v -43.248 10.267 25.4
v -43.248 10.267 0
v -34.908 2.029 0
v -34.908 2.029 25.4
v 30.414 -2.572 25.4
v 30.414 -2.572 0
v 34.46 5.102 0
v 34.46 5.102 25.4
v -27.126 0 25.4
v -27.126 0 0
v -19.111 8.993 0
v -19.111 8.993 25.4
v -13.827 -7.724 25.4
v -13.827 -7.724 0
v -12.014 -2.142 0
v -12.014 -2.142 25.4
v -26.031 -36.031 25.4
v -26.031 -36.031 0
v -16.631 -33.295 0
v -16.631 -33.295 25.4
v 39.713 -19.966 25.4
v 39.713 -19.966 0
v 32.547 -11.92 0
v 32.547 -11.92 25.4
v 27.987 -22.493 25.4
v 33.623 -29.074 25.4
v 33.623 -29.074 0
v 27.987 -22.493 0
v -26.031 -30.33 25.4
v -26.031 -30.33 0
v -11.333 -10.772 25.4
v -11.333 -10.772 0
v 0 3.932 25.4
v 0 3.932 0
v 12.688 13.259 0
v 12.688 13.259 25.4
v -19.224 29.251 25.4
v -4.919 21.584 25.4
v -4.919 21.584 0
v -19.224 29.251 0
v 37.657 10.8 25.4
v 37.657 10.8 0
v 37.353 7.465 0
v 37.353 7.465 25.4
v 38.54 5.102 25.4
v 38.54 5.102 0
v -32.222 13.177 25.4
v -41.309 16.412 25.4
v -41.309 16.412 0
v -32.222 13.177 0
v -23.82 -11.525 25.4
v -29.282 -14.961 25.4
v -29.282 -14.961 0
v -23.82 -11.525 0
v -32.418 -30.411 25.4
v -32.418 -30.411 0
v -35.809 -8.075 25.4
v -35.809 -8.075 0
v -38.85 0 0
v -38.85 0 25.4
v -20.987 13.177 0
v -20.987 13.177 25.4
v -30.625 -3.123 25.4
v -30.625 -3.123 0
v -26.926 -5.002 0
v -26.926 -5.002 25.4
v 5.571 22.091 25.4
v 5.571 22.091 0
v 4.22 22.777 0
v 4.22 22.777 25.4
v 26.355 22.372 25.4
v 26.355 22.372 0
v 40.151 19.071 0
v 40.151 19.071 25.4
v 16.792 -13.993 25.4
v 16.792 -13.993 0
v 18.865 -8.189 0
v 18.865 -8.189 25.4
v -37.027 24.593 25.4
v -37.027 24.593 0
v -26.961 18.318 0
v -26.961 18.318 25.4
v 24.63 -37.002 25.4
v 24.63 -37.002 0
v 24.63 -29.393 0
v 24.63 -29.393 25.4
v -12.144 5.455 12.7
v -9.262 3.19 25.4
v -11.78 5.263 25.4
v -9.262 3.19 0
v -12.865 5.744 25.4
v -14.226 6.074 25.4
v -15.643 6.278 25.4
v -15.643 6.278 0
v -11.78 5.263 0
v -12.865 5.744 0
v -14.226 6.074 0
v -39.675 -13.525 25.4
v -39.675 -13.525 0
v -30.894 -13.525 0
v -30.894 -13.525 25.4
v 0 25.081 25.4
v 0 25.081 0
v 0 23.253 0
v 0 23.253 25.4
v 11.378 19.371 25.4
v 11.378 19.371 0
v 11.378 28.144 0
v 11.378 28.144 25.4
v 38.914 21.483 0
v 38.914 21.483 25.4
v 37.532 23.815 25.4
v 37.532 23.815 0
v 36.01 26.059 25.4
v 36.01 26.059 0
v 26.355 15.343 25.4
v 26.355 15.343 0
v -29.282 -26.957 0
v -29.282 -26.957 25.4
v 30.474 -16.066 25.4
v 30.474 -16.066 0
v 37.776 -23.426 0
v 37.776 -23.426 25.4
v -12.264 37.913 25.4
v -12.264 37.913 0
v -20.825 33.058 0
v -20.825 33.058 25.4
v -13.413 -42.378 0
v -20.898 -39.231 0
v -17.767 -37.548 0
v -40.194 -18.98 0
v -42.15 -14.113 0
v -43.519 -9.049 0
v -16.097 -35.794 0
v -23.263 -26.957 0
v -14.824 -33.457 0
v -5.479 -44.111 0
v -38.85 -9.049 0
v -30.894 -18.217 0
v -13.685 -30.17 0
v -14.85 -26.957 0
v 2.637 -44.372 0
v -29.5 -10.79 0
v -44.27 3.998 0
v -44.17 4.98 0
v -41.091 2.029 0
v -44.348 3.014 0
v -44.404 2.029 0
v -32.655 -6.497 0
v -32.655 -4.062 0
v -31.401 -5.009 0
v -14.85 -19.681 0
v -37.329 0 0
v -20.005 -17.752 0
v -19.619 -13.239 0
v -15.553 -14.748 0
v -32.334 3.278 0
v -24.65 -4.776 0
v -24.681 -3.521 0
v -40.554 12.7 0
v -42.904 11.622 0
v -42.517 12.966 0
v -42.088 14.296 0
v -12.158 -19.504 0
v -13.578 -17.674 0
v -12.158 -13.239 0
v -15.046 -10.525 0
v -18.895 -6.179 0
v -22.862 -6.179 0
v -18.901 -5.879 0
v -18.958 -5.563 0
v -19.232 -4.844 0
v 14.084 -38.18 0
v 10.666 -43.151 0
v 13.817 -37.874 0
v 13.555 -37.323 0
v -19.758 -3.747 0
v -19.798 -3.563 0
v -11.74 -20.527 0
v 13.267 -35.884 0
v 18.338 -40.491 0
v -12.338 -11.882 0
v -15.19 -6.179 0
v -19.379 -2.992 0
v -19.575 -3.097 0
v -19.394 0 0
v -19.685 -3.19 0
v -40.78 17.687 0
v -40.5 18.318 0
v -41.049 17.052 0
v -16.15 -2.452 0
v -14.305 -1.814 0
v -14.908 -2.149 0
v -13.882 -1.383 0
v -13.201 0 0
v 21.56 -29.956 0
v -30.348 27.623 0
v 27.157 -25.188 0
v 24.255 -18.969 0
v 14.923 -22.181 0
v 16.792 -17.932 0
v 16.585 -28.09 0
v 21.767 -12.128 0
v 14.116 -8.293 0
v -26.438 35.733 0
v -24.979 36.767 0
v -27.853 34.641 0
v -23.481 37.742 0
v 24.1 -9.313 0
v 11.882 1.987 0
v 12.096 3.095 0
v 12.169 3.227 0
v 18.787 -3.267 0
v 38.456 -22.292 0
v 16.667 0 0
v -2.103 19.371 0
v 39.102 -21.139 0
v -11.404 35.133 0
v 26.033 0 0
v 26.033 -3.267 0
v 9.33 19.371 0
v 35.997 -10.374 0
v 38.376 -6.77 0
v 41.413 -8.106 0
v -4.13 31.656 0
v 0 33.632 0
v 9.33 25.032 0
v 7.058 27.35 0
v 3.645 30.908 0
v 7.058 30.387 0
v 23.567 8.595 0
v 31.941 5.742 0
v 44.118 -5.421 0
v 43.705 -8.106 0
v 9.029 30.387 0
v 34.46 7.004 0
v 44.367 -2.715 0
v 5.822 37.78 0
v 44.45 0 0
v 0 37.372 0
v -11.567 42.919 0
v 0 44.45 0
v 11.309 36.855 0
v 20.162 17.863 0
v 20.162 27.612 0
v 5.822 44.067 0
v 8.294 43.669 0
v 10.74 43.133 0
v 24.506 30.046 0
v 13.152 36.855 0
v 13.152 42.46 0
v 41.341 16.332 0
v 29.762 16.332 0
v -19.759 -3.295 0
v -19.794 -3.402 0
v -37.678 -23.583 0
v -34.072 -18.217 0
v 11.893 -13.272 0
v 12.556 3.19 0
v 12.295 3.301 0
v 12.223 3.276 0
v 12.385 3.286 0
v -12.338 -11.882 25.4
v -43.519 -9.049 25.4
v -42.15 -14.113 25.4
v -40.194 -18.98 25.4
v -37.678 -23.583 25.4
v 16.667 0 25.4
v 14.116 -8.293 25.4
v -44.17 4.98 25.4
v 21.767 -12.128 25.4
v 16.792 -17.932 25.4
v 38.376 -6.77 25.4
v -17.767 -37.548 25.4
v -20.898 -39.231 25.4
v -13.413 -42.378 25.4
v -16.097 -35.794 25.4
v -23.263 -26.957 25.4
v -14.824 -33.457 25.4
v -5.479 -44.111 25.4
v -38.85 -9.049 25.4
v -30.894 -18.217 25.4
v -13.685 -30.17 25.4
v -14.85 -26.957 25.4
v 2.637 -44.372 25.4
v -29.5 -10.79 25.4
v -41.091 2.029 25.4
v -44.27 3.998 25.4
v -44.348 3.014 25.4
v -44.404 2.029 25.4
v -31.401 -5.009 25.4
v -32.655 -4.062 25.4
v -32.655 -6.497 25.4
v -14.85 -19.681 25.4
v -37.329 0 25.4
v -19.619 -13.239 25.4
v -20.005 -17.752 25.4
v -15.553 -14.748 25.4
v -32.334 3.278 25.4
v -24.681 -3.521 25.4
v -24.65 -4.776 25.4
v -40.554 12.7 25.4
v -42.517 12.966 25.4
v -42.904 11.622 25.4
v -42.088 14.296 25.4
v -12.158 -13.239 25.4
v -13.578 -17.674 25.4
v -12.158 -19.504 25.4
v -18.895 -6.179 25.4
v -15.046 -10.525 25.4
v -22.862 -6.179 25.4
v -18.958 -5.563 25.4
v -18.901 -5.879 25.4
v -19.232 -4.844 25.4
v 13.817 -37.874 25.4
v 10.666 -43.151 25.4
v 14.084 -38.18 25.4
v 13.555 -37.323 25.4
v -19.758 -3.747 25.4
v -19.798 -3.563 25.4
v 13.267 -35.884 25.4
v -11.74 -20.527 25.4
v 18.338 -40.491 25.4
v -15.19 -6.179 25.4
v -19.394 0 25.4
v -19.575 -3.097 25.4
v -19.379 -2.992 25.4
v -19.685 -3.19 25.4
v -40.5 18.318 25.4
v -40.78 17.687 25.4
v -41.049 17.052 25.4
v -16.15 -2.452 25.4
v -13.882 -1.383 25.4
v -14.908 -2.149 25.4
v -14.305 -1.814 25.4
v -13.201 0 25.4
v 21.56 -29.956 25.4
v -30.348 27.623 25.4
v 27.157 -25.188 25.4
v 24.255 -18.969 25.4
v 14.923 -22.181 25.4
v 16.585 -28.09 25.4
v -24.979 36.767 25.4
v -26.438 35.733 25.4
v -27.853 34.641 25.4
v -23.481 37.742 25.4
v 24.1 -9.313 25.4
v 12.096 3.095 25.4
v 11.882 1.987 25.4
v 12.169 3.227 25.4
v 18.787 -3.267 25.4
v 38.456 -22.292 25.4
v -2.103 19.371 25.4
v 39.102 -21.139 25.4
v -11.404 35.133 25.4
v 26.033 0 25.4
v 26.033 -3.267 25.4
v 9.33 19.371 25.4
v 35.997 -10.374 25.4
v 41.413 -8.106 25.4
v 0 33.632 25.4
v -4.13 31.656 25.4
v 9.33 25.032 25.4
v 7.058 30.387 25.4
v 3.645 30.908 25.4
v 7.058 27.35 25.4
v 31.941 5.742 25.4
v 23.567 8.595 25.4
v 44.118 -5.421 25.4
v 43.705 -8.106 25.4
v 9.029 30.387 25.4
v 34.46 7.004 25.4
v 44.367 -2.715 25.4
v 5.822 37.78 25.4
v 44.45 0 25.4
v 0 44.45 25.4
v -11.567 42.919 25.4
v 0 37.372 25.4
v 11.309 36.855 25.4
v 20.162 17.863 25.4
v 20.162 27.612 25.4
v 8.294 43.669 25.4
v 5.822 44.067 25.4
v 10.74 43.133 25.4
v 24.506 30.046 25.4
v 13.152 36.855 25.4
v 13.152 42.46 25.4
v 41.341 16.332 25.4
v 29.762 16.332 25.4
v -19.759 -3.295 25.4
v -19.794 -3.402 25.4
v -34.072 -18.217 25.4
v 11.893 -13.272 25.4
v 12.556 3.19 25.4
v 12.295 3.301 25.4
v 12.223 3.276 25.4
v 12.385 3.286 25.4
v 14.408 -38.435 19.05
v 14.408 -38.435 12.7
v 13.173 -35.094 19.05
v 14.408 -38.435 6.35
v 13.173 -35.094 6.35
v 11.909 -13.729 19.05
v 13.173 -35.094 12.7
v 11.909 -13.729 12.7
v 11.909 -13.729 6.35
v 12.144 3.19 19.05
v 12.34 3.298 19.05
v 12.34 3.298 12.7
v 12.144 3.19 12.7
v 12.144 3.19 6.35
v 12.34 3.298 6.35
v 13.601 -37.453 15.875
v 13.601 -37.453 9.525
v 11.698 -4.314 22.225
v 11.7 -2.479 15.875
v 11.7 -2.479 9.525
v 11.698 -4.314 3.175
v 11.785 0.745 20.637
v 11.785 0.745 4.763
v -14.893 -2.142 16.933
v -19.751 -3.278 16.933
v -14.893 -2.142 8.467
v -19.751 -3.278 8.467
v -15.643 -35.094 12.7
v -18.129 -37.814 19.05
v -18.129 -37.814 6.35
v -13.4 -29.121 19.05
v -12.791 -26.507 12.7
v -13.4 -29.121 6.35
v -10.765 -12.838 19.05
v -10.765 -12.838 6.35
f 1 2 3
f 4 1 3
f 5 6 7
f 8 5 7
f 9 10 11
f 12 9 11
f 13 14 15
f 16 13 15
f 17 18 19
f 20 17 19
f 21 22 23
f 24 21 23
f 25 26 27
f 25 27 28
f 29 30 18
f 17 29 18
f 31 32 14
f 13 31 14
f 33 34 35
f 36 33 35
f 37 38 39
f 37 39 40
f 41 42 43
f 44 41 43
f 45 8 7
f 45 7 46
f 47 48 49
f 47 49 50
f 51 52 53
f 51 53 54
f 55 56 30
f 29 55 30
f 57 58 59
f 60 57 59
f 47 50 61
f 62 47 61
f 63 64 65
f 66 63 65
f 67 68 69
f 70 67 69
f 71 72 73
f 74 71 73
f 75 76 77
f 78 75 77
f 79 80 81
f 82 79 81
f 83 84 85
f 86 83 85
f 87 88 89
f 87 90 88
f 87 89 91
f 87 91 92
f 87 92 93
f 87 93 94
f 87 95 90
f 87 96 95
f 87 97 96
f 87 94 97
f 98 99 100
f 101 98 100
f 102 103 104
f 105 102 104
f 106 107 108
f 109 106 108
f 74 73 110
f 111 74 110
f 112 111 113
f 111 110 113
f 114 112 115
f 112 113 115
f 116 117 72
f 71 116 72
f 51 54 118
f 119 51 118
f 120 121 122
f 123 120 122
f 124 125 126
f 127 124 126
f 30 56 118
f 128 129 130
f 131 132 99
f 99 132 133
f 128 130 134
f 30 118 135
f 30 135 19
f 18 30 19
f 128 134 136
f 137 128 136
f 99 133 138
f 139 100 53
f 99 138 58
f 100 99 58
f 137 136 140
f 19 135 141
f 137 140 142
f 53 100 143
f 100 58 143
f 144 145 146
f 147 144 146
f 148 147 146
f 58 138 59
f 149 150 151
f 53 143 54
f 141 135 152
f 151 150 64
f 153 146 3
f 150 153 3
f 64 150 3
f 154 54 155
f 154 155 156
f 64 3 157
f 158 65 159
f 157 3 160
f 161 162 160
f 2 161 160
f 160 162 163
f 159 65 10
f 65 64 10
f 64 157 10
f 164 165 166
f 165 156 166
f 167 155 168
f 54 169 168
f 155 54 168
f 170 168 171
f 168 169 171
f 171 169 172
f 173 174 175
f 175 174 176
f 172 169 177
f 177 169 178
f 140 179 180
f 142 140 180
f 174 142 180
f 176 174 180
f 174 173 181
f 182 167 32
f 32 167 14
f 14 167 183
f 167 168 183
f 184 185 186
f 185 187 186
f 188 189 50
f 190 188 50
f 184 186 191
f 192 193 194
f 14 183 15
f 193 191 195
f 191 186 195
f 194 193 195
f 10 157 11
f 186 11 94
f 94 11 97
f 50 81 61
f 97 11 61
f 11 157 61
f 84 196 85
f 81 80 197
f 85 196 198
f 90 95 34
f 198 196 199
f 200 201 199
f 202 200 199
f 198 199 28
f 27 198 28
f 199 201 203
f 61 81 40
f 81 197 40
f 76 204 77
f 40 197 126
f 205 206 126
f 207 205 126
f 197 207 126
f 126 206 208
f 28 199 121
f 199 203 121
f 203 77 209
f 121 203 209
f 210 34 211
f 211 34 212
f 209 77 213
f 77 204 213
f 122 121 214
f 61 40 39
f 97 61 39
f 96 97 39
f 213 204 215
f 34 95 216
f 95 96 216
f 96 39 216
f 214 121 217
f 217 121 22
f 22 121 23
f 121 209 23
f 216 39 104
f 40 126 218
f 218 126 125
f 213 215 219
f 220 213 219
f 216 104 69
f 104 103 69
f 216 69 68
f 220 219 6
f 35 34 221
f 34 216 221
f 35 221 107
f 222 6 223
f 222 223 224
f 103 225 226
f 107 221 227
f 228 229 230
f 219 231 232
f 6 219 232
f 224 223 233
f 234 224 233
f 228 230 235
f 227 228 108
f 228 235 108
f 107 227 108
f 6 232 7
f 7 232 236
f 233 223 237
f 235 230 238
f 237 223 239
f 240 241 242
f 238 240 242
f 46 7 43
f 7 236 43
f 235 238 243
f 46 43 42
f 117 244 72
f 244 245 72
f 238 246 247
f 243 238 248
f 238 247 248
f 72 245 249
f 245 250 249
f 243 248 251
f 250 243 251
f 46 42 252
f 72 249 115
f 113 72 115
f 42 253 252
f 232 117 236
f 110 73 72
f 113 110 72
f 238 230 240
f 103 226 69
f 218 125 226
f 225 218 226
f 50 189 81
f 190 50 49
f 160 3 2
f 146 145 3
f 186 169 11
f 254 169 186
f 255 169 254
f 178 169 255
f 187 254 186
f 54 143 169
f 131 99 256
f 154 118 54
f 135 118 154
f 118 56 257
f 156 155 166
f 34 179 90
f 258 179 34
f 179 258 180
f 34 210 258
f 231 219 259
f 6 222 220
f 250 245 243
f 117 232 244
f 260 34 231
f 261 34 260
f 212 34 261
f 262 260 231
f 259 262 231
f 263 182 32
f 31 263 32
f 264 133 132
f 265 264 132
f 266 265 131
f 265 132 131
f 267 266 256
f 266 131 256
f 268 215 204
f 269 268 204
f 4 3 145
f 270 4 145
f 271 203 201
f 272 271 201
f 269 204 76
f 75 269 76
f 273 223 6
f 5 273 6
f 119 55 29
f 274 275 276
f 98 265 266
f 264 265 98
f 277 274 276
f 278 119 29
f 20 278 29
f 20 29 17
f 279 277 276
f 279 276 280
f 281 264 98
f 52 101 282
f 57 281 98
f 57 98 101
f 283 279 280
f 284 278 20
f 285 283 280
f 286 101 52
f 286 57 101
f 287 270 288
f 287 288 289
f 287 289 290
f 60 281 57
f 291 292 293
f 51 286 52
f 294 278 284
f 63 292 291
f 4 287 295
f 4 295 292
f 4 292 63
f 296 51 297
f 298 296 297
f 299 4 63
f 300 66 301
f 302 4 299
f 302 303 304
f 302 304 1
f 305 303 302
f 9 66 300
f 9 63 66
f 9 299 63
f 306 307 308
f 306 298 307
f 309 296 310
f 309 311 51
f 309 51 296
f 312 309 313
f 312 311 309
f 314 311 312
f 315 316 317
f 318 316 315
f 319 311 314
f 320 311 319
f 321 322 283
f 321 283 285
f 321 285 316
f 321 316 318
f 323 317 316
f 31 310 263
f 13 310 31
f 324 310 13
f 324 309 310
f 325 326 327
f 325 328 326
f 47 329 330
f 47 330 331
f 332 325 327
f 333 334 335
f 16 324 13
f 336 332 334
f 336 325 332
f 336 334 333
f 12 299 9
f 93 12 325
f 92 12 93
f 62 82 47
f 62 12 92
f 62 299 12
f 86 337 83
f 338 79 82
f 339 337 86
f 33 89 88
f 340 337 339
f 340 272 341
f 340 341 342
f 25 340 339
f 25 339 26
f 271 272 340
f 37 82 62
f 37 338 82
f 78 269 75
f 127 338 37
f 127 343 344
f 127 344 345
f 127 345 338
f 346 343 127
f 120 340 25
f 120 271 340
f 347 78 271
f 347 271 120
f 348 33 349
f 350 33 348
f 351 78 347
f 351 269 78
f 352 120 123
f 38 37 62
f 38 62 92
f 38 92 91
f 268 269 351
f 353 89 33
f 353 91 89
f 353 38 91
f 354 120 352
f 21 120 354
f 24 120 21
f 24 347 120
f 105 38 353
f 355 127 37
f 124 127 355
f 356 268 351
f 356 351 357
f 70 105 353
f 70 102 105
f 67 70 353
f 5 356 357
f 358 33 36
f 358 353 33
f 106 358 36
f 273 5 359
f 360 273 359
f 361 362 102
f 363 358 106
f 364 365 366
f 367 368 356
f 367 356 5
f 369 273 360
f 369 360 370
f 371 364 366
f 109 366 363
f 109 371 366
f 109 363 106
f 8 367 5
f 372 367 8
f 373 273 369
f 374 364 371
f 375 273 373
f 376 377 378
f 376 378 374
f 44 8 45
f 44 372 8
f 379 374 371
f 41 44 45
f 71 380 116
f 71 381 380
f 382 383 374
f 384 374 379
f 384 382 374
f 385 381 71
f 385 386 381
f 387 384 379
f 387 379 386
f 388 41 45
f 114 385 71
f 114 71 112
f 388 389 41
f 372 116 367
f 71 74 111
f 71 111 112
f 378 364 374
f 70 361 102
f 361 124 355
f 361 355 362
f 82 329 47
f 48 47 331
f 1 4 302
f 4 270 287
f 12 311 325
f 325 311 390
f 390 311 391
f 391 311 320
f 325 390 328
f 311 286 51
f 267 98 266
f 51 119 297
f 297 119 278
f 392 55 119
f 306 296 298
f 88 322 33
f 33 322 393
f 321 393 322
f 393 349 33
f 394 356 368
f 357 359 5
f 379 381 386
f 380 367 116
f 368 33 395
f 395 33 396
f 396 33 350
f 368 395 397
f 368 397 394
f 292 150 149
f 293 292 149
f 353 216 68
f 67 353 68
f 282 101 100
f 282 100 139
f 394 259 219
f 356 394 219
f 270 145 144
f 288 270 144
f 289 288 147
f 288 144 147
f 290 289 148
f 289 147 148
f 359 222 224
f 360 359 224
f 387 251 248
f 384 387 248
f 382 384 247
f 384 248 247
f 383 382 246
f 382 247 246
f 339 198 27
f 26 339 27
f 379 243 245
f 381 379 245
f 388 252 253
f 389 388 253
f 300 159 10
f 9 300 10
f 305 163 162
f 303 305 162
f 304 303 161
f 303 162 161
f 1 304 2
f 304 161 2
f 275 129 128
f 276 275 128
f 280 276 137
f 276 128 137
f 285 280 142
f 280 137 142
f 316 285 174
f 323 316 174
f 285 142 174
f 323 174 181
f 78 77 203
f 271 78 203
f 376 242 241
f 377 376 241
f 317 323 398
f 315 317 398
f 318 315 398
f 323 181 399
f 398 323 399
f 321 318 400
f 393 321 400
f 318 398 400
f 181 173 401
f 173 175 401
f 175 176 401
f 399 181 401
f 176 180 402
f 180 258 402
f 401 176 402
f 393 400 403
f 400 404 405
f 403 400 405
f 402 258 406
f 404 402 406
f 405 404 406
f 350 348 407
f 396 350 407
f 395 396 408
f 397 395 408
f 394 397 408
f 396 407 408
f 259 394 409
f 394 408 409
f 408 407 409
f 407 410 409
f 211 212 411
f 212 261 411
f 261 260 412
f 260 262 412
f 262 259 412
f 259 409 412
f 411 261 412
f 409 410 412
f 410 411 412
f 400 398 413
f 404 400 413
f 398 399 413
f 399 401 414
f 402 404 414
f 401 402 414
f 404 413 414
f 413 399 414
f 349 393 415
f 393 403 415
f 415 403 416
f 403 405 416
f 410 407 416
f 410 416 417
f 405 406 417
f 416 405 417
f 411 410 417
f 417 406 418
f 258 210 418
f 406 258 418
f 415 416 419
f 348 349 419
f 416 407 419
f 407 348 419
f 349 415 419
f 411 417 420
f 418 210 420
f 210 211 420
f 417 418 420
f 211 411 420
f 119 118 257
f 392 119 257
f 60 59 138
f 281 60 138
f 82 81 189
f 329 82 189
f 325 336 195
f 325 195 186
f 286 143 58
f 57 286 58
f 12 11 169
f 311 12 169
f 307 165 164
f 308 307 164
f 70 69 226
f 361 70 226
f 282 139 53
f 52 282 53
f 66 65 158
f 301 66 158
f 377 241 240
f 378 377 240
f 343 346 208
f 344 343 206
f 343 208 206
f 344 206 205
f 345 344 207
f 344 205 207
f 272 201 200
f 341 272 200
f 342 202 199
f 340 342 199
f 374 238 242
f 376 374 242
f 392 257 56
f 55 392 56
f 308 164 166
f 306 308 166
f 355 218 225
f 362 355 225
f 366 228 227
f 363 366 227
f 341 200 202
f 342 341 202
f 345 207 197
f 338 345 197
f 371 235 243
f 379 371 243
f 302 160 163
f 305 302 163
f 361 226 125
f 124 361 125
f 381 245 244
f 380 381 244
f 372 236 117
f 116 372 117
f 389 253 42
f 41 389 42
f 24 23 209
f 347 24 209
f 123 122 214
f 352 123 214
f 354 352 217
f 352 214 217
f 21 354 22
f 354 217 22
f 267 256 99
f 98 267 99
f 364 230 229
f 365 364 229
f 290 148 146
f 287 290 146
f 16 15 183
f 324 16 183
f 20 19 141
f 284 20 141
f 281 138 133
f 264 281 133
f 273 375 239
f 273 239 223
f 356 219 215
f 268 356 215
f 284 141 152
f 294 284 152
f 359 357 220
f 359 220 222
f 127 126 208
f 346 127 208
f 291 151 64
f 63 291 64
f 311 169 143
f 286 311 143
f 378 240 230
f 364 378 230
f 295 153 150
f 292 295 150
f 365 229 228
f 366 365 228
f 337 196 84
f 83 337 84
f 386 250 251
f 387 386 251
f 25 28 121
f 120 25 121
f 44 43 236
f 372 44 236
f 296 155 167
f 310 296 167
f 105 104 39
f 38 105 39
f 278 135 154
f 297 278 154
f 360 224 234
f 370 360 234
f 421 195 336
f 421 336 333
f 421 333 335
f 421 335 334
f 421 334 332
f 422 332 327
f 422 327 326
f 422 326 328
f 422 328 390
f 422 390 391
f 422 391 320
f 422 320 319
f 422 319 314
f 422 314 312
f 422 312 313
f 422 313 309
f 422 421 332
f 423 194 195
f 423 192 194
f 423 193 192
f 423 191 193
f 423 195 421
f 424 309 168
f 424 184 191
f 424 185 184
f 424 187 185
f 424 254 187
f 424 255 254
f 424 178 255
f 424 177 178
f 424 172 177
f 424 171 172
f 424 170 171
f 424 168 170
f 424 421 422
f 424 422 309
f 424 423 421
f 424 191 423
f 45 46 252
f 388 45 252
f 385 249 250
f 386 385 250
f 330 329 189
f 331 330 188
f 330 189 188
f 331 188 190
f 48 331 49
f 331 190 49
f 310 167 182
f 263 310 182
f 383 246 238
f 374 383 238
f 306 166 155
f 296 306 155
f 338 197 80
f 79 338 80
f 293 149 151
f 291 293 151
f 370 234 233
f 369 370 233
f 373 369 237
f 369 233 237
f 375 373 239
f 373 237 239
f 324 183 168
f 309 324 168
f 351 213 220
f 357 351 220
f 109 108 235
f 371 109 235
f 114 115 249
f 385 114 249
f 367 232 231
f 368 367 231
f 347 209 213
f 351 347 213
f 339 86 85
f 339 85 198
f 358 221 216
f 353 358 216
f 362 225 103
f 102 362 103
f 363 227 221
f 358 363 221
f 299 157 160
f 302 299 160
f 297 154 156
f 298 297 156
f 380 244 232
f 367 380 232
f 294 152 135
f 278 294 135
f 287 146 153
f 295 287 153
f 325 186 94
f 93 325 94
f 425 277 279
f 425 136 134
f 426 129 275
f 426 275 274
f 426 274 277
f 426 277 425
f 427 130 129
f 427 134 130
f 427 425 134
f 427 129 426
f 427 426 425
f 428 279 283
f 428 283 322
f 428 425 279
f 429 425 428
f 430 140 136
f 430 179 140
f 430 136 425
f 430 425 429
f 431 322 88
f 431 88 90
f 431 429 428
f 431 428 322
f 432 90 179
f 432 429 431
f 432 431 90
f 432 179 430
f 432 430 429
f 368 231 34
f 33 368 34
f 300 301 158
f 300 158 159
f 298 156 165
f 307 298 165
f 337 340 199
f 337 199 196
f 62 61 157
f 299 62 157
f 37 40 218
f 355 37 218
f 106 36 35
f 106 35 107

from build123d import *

# Parameters (mm, degrees)
F1_DEPTH = 25.4


with BuildPart() as f1:
    # F0 (on Top) → F1 (new body)
    with BuildSketch(Plane.XY):
        with BuildLine():
            ThreePointArc((43.704676099, -8.1057872589), (44.2632768364, -4.0699906266), (44.45, 0))
            Line((44.45, 0), (38.3762454863, -6.7695145848))
            Line((38.3762454863, -6.7695145848), (30.4140662095, -2.5716401001))
            Line((30.4140662095, -2.5716401001), (34.4598693357, 5.1021028682))
            Line((34.4598693357, 5.1021028682), (38.5398091507, 5.1021028682))
            Line((38.5398091507, 5.1021028682), (41.340966117, 16.3317794656))
            Line((41.340966117, 16.3317794656), (29.7620025051, 16.3317794656))
            Line((29.7620025051, 16.3317794656), (37.6569107253, 10.7998840139))
            Line((37.6569107253, 10.7998840139), (37.3528477732, 7.4648817648))
            Line((37.3528477732, 7.4648817648), (34.4598693357, 7.0039533134))
            Line((34.4598693357, 7.0039533134), (26.3554092655, 15.3433524242))
            Line((26.3554092655, 15.3433524242), (26.3554092655, 22.3718555596))
            Line((26.3554092655, 22.3718555596), (40.1509507291, 19.0710161121))
            ThreePointArc((40.1509507291, 19.0710161121), (38.2404494141, 22.6598880979), (36.0100197183, 26.0591822567))
            Line((36.0100197183, 26.0591822567), (24.5059830732, 30.046253556))
            Line((24.5059830732, 30.046253556), (13.1523255345, 36.8548135049))
            Line((13.1523255345, 36.8548135049), (13.1523255345, 42.4596141414))
            ThreePointArc((13.1523255345, 42.4596141414), (9.520993243, 43.418350817), (5.8216881898, 44.0671129826))
            Line((5.8216881898, 44.0671129826), (5.8216881898, 37.7795321464))
            Line((5.8216881898, 37.7795321464), (0, 44.45))
            Line((0, 44.45), (-11.5668197775, 42.9186577171))
            Line((-11.5668197775, 42.9186577171), (0, 37.3720790271))
            Line((0, 37.3720790271), (7.0577384585, 30.3874456776))
            Line((7.0577384585, 30.3874456776), (3.6453471464, 30.9077701819))
            Line((3.6453471464, 30.9077701819), (7.0577384585, 27.3500500395))
            Line((7.0577384585, 27.3500500395), (9.3304236081, 25.0318586734))
            Line((9.3304236081, 25.0318586734), (9.3304236081, 19.3706885501))
            Line((9.3304236081, 19.3706885501), (-2.1026324375, 19.3706885501))
            Line((-2.1026324375, 19.3706885501), (5.5705367236, 22.0912819416))
            Line((5.5705367236, 22.0912819416), (4.2201406021, 22.7765895828))
            Line((4.2201406021, 22.7765895828), (0, 33.6315410045))
            Line((0, 33.6315410045), (-12.2639499105, 37.9127315635))
            Line((-12.2639499105, 37.9127315635), (-20.8245608606, 33.0582727561))
            Line((-20.8245608606, 33.0582727561), (-23.4805989564, 37.7420716528))
            ThreePointArc((-23.4805989564, 37.7420716528), (-25.7137068729, 36.2575203076), (-27.853233261, 34.6410146634))
            Line((-27.853233261, 34.6410146634), (-30.3483057479, 27.6229865325))
            Line((-30.3483057479, 27.6229865325), (-37.0270949757, 24.5926155108))
            Line((-37.0270949757, 24.5926155108), (-26.9607932241, 18.317772023))
            Line((-26.9607932241, 18.317772023), (-40.5001447913, 18.317772023))
            ThreePointArc((-40.5001447913, 18.317772023), (-40.9156869326, 17.3697744036), (-41.3090426286, 16.4123580605))
            Line((-41.3090426286, 16.4123580605), (-32.2220331053, 13.1766568099))
            Line((-32.2220331053, 13.1766568099), (-20.9865597638, 13.1766568099))
            Line((-20.9865597638, 13.1766568099), (-32.3342754558, 3.2778158817))
            Line((-32.3342754558, 3.2778158817), (-40.5535289611, 12.7001060929))
            Line((-40.5535289611, 12.7001060929), (-42.0881711734, 14.2964452671))
            ThreePointArc((-42.0881711734, 14.2964452671), (-42.7156199987, 12.2954588416), (-43.247994613, 10.2671058217))
            Line((-43.247994613, 10.2671058217), (-34.9080591648, 2.0286042741))
            Line((-34.9080591648, 2.0286042741), (-44.1701690125, 4.9798262425))
            ThreePointArc((-44.1701690125, 4.9798262425), (-44.311503506, 3.5061598702), (-44.4036852603, 2.0286042741))
            Line((-44.4036852603, 2.0286042741), (-41.0906250328, 2.0286042741))
            Line((-41.0906250328, 2.0286042741), (-37.3294337081, 0))
            Line((-37.3294337081, 0), (-32.6545804034, -4.0618134039))
            Line((-32.6545804034, -4.0618134039), (-32.6545804034, -6.4967229435))
            Line((-32.6545804034, -6.4967229435), (-31.4006268427, -5.0094540041))
            Line((-31.4006268427, -5.0094540041), (-30.6248067702, -3.1227373514))
            Line((-30.6248067702, -3.1227373514), (-26.9258844929, -5.0023249455))
            Line((-26.9258844929, -5.0023249455), (-24.6496018838, -4.7759504527))
            Line((-24.6496018838, -4.7759504527), (-24.680626463, -3.5207036625))
            Line((-24.680626463, -3.5207036625), (-27.1262085414, 0))
            Line((-27.1262085414, 0), (-19.111280333, 8.9932536787))
            Line((-19.111280333, 8.9932536787), (-22.8618391946, -6.1794005338))
            Line((-22.8618391946, -6.1794005338), (-29.4998778801, -10.790373226))
            Line((-29.4998778801, -10.790373226), (-35.8092829268, -8.075045983))
            Line((-35.8092829268, -8.075045983), (-38.8495844895, 0))
            Line((-38.8495844895, 0), (-38.8495844895, -9.0487861421))
            Line((-38.8495844895, -9.0487861421), (-43.5192137952, -9.0487861421))
            ThreePointArc((-43.5192137952, -9.0487861421), (-41.2439066607, -16.5753631444), (-37.6780041311, -23.5832674729))
            Line((-37.6780041311, -23.5832674729), (-39.6750552833, -13.5251467775))
            Line((-39.6750552833, -13.5251467775), (-30.8937566892, -13.5251467775))
            Line((-30.8937566892, -13.5251467775), (-30.8937566892, -18.2168473015))
            Line((-30.8937566892, -18.2168473015), (-29.2824792269, -14.9614370338))
            Line((-29.2824792269, -14.9614370338), (-23.8202681725, -11.5252173406))
            Line((-23.8202681725, -11.5252173406), (-29.2824792269, -26.9571319202))
            Line((-29.2824792269, -26.9571319202), (-34.0718732776, -18.2168473015))
            Line((-34.0718732776, -18.2168473015), (-32.4182662921, -30.4114864914))
            Line((-32.4182662921, -30.4114864914), (-26.0305313037, -30.3295583668))
            Line((-26.0305313037, -30.3295583668), (-26.0305313037, -36.0307360464))
            Line((-26.0305313037, -36.0307360464), (-16.6308986723, -33.2953852711))
            Line((-16.6308986723, -33.2953852711), (-14.8497161906, -26.9571319202))
            Line((-14.8497161906, -26.9571319202), (-14.8497161906, -19.681075499))
            Line((-14.8497161906, -19.681075499), (-23.2630656429, -26.9571319202))
            Line((-23.2630656429, -26.9571319202), (-20.0048710871, -17.7520353818))
            Line((-20.0048710871, -17.7520353818), (-15.5527187897, -14.7480303308))
            Line((-15.5527187897, -14.7480303308), (-13.5784722435, -17.6740062021))
            Line((-13.5784722435, -17.6740062021), (-12.1584481763, -19.5038274832))
            Line((-12.1584481763, -19.5038274832), (-12.1584481763, -13.2389037838))
            Line((-12.1584481763, -13.2389037838), (-19.6191504902, -13.2389037838))
            Line((-19.6191504902, -13.2389037838), (-15.0464561653, -10.5254098808))
            Line((-15.0464561653, -10.5254098808), (-12.3378359363, -11.8821568323))
            Line((-12.3378359363, -11.8821568323), (-11.3327408226, -10.7720452013))
            Line((-11.3327408226, -10.7720452013), (-13.8265134831, -7.7241360835))
            Line((-13.8265134831, -7.7241360835), (-12.014329364, -2.1424514692))
            Line((-12.014329364, -2.1424514692), (-15.1898814267, -6.1794005338))
            Line((-15.1898814267, -6.1794005338), (-18.8946343708, -6.1794005338))
            add(Edge.make_bspline(
                [(-13.2013149351, 0), (-13.5679742386, -0.867562918), (-14.1417802712, -2.8551336689), (-21.6731611335, -2.4070426946), (-18.8164656554, -4.9714057174), (-18.8946343708, -6.1794005338)],
                knots=[0, 0, 0, 0, 0.2937199062, 0.6908083029, 1, 1, 1, 1], degree=3))
            Line((-13.2013149351, 0), (-19.394499122, 0))
            Line((-19.394499122, 0), (-15.643126382, 6.2778336934))
            add(Edge.make_bspline(
                [(-9.2623769855, 3.1903743622), (-10.1683737145, 4.0650652939), (-11.9716685733, 5.8060491295), (-14.4232490293, 6.1210787108), (-15.643126382, 6.2778336934)],
                knots=[0, 0, 0, 0, 0.5024118627, 1, 1, 1, 1], degree=3))
            add(Edge.make_bspline(
                [(-20.8984651632, -39.2308125563), (-19.0227174729, -38.4354283736), (-12.6089325614, -35.6754345167), (-10.6492832076, -12.9029994524), (-9.2623769855, 3.1903743622)],
                knots=[0, 0, 0, 0, 0.2933422321, 1, 1, 1, 1], degree=3))
            ThreePointArc((-20.8984651632, -39.2308125563), (-1.4267302198, -44.4270969216), (18.3382861829, -40.4908602017))
            add(Edge.make_bspline(
                [(18.3382861829, -40.4908602017), (16.800650041, -39.7684573781), (13.8810869179, -38.3785879352), (12.7340809413, -36.0534150056), (10.8537079929, 4.3088263933), (12.4095863322, 3.2863546111), (12.5556673868, 3.1903743622)],
                knots=[0, 0, 0, 0, 0.1945745472, 0.3689525646, 0.9407210575, 1, 1, 1, 1], degree=3))
            Line((12.5556673868, 3.1903743622), (26.0327312476, 0))
            Line((26.0327312476, 0), (16.6674540937, 0))
            Line((16.6674540937, 0), (14.1163282306, -8.2934123817))
            Line((14.1163282306, -8.2934123817), (16.7920096617, -13.9933407127))
            Line((16.7920096617, -13.9933407127), (18.8650966271, -8.1886949246))
            Line((18.8650966271, -8.1886949246), (21.7674178411, -12.1275609654))
            Line((21.7674178411, -12.1275609654), (16.7920096617, -17.9322074255))
            Line((16.7920096617, -17.9322074255), (14.9226369154, -22.1807765402))
            Line((14.9226369154, -22.1807765402), (16.5846997555, -28.0903350345))
            Line((16.5846997555, -28.0903350345), (24.2551246189, -18.9687502362))
            Line((24.2551246189, -18.9687502362), (21.5601079349, -29.9561134378))
            Line((21.5601079349, -29.9561134378), (24.6297491832, -37.0024047215))
            Line((24.6297491832, -37.0024047215), (24.6297491832, -29.3928310512))
            Line((24.6297491832, -29.3928310512), (27.1574471769, -25.1880124765))
            Line((27.1574471769, -25.1880124765), (33.6225707529, -29.074477398))
            Line((33.6225707529, -29.074477398), (27.9866814255, -22.4929984806))
            Line((27.9866814255, -22.4929984806), (30.4743868592, -16.0664276781))
            Line((30.4743868592, -16.0664276781), (37.7759431419, -23.4260670993))
            ThreePointArc((37.7759431419, -23.4260670993), (38.783221777, -21.7178315814), (39.7133054721, -19.9663684349))
            Line((39.7133054721, -19.9663684349), (32.5474751687, -11.9202537473))
            Line((32.5474751687, -11.9202537473), (24.099831034, -9.3132333563))
            Line((24.099831034, -9.3132333563), (18.7873544042, -3.2667341875))
            Line((18.7873544042, -3.2667341875), (26.0327312476, -3.2667341875))
            Line((26.0327312476, -3.2667341875), (35.9974019018, -10.3736902339))
            Line((35.9974019018, -10.3736902339), (41.4131227431, -8.1057872589))
            Line((41.4131227431, -8.1057872589), (43.704676099, -8.1057872589))
        make_face()
        Polygon((-4.9189029301, 21.5841254968), (-19.2240415026, 29.2505866358), (-11.4039010319, 35.1327965548), (-4.1301422855, 31.6558589691), (0, 25.0814852009), (0, 23.2533977972), align=None, mode=Mode.SUBTRACT)
        Polygon((12.6878964172, 13.258886178), (11.3784278194, 19.3706885501), (11.3784278194, 28.1440664159), (9.0285656372, 30.3874456776), (11.3085236792, 36.8548135049), (20.1618225394, 27.6124433138), (20.1618225394, 17.8627432901), (31.941140432, 5.741956426), (23.5674446572, 8.5952473997), (0, 3.9316086214), align=None, mode=Mode.SUBTRACT)
    extrude(amount=F1_DEPTH)


solid = f1.part
